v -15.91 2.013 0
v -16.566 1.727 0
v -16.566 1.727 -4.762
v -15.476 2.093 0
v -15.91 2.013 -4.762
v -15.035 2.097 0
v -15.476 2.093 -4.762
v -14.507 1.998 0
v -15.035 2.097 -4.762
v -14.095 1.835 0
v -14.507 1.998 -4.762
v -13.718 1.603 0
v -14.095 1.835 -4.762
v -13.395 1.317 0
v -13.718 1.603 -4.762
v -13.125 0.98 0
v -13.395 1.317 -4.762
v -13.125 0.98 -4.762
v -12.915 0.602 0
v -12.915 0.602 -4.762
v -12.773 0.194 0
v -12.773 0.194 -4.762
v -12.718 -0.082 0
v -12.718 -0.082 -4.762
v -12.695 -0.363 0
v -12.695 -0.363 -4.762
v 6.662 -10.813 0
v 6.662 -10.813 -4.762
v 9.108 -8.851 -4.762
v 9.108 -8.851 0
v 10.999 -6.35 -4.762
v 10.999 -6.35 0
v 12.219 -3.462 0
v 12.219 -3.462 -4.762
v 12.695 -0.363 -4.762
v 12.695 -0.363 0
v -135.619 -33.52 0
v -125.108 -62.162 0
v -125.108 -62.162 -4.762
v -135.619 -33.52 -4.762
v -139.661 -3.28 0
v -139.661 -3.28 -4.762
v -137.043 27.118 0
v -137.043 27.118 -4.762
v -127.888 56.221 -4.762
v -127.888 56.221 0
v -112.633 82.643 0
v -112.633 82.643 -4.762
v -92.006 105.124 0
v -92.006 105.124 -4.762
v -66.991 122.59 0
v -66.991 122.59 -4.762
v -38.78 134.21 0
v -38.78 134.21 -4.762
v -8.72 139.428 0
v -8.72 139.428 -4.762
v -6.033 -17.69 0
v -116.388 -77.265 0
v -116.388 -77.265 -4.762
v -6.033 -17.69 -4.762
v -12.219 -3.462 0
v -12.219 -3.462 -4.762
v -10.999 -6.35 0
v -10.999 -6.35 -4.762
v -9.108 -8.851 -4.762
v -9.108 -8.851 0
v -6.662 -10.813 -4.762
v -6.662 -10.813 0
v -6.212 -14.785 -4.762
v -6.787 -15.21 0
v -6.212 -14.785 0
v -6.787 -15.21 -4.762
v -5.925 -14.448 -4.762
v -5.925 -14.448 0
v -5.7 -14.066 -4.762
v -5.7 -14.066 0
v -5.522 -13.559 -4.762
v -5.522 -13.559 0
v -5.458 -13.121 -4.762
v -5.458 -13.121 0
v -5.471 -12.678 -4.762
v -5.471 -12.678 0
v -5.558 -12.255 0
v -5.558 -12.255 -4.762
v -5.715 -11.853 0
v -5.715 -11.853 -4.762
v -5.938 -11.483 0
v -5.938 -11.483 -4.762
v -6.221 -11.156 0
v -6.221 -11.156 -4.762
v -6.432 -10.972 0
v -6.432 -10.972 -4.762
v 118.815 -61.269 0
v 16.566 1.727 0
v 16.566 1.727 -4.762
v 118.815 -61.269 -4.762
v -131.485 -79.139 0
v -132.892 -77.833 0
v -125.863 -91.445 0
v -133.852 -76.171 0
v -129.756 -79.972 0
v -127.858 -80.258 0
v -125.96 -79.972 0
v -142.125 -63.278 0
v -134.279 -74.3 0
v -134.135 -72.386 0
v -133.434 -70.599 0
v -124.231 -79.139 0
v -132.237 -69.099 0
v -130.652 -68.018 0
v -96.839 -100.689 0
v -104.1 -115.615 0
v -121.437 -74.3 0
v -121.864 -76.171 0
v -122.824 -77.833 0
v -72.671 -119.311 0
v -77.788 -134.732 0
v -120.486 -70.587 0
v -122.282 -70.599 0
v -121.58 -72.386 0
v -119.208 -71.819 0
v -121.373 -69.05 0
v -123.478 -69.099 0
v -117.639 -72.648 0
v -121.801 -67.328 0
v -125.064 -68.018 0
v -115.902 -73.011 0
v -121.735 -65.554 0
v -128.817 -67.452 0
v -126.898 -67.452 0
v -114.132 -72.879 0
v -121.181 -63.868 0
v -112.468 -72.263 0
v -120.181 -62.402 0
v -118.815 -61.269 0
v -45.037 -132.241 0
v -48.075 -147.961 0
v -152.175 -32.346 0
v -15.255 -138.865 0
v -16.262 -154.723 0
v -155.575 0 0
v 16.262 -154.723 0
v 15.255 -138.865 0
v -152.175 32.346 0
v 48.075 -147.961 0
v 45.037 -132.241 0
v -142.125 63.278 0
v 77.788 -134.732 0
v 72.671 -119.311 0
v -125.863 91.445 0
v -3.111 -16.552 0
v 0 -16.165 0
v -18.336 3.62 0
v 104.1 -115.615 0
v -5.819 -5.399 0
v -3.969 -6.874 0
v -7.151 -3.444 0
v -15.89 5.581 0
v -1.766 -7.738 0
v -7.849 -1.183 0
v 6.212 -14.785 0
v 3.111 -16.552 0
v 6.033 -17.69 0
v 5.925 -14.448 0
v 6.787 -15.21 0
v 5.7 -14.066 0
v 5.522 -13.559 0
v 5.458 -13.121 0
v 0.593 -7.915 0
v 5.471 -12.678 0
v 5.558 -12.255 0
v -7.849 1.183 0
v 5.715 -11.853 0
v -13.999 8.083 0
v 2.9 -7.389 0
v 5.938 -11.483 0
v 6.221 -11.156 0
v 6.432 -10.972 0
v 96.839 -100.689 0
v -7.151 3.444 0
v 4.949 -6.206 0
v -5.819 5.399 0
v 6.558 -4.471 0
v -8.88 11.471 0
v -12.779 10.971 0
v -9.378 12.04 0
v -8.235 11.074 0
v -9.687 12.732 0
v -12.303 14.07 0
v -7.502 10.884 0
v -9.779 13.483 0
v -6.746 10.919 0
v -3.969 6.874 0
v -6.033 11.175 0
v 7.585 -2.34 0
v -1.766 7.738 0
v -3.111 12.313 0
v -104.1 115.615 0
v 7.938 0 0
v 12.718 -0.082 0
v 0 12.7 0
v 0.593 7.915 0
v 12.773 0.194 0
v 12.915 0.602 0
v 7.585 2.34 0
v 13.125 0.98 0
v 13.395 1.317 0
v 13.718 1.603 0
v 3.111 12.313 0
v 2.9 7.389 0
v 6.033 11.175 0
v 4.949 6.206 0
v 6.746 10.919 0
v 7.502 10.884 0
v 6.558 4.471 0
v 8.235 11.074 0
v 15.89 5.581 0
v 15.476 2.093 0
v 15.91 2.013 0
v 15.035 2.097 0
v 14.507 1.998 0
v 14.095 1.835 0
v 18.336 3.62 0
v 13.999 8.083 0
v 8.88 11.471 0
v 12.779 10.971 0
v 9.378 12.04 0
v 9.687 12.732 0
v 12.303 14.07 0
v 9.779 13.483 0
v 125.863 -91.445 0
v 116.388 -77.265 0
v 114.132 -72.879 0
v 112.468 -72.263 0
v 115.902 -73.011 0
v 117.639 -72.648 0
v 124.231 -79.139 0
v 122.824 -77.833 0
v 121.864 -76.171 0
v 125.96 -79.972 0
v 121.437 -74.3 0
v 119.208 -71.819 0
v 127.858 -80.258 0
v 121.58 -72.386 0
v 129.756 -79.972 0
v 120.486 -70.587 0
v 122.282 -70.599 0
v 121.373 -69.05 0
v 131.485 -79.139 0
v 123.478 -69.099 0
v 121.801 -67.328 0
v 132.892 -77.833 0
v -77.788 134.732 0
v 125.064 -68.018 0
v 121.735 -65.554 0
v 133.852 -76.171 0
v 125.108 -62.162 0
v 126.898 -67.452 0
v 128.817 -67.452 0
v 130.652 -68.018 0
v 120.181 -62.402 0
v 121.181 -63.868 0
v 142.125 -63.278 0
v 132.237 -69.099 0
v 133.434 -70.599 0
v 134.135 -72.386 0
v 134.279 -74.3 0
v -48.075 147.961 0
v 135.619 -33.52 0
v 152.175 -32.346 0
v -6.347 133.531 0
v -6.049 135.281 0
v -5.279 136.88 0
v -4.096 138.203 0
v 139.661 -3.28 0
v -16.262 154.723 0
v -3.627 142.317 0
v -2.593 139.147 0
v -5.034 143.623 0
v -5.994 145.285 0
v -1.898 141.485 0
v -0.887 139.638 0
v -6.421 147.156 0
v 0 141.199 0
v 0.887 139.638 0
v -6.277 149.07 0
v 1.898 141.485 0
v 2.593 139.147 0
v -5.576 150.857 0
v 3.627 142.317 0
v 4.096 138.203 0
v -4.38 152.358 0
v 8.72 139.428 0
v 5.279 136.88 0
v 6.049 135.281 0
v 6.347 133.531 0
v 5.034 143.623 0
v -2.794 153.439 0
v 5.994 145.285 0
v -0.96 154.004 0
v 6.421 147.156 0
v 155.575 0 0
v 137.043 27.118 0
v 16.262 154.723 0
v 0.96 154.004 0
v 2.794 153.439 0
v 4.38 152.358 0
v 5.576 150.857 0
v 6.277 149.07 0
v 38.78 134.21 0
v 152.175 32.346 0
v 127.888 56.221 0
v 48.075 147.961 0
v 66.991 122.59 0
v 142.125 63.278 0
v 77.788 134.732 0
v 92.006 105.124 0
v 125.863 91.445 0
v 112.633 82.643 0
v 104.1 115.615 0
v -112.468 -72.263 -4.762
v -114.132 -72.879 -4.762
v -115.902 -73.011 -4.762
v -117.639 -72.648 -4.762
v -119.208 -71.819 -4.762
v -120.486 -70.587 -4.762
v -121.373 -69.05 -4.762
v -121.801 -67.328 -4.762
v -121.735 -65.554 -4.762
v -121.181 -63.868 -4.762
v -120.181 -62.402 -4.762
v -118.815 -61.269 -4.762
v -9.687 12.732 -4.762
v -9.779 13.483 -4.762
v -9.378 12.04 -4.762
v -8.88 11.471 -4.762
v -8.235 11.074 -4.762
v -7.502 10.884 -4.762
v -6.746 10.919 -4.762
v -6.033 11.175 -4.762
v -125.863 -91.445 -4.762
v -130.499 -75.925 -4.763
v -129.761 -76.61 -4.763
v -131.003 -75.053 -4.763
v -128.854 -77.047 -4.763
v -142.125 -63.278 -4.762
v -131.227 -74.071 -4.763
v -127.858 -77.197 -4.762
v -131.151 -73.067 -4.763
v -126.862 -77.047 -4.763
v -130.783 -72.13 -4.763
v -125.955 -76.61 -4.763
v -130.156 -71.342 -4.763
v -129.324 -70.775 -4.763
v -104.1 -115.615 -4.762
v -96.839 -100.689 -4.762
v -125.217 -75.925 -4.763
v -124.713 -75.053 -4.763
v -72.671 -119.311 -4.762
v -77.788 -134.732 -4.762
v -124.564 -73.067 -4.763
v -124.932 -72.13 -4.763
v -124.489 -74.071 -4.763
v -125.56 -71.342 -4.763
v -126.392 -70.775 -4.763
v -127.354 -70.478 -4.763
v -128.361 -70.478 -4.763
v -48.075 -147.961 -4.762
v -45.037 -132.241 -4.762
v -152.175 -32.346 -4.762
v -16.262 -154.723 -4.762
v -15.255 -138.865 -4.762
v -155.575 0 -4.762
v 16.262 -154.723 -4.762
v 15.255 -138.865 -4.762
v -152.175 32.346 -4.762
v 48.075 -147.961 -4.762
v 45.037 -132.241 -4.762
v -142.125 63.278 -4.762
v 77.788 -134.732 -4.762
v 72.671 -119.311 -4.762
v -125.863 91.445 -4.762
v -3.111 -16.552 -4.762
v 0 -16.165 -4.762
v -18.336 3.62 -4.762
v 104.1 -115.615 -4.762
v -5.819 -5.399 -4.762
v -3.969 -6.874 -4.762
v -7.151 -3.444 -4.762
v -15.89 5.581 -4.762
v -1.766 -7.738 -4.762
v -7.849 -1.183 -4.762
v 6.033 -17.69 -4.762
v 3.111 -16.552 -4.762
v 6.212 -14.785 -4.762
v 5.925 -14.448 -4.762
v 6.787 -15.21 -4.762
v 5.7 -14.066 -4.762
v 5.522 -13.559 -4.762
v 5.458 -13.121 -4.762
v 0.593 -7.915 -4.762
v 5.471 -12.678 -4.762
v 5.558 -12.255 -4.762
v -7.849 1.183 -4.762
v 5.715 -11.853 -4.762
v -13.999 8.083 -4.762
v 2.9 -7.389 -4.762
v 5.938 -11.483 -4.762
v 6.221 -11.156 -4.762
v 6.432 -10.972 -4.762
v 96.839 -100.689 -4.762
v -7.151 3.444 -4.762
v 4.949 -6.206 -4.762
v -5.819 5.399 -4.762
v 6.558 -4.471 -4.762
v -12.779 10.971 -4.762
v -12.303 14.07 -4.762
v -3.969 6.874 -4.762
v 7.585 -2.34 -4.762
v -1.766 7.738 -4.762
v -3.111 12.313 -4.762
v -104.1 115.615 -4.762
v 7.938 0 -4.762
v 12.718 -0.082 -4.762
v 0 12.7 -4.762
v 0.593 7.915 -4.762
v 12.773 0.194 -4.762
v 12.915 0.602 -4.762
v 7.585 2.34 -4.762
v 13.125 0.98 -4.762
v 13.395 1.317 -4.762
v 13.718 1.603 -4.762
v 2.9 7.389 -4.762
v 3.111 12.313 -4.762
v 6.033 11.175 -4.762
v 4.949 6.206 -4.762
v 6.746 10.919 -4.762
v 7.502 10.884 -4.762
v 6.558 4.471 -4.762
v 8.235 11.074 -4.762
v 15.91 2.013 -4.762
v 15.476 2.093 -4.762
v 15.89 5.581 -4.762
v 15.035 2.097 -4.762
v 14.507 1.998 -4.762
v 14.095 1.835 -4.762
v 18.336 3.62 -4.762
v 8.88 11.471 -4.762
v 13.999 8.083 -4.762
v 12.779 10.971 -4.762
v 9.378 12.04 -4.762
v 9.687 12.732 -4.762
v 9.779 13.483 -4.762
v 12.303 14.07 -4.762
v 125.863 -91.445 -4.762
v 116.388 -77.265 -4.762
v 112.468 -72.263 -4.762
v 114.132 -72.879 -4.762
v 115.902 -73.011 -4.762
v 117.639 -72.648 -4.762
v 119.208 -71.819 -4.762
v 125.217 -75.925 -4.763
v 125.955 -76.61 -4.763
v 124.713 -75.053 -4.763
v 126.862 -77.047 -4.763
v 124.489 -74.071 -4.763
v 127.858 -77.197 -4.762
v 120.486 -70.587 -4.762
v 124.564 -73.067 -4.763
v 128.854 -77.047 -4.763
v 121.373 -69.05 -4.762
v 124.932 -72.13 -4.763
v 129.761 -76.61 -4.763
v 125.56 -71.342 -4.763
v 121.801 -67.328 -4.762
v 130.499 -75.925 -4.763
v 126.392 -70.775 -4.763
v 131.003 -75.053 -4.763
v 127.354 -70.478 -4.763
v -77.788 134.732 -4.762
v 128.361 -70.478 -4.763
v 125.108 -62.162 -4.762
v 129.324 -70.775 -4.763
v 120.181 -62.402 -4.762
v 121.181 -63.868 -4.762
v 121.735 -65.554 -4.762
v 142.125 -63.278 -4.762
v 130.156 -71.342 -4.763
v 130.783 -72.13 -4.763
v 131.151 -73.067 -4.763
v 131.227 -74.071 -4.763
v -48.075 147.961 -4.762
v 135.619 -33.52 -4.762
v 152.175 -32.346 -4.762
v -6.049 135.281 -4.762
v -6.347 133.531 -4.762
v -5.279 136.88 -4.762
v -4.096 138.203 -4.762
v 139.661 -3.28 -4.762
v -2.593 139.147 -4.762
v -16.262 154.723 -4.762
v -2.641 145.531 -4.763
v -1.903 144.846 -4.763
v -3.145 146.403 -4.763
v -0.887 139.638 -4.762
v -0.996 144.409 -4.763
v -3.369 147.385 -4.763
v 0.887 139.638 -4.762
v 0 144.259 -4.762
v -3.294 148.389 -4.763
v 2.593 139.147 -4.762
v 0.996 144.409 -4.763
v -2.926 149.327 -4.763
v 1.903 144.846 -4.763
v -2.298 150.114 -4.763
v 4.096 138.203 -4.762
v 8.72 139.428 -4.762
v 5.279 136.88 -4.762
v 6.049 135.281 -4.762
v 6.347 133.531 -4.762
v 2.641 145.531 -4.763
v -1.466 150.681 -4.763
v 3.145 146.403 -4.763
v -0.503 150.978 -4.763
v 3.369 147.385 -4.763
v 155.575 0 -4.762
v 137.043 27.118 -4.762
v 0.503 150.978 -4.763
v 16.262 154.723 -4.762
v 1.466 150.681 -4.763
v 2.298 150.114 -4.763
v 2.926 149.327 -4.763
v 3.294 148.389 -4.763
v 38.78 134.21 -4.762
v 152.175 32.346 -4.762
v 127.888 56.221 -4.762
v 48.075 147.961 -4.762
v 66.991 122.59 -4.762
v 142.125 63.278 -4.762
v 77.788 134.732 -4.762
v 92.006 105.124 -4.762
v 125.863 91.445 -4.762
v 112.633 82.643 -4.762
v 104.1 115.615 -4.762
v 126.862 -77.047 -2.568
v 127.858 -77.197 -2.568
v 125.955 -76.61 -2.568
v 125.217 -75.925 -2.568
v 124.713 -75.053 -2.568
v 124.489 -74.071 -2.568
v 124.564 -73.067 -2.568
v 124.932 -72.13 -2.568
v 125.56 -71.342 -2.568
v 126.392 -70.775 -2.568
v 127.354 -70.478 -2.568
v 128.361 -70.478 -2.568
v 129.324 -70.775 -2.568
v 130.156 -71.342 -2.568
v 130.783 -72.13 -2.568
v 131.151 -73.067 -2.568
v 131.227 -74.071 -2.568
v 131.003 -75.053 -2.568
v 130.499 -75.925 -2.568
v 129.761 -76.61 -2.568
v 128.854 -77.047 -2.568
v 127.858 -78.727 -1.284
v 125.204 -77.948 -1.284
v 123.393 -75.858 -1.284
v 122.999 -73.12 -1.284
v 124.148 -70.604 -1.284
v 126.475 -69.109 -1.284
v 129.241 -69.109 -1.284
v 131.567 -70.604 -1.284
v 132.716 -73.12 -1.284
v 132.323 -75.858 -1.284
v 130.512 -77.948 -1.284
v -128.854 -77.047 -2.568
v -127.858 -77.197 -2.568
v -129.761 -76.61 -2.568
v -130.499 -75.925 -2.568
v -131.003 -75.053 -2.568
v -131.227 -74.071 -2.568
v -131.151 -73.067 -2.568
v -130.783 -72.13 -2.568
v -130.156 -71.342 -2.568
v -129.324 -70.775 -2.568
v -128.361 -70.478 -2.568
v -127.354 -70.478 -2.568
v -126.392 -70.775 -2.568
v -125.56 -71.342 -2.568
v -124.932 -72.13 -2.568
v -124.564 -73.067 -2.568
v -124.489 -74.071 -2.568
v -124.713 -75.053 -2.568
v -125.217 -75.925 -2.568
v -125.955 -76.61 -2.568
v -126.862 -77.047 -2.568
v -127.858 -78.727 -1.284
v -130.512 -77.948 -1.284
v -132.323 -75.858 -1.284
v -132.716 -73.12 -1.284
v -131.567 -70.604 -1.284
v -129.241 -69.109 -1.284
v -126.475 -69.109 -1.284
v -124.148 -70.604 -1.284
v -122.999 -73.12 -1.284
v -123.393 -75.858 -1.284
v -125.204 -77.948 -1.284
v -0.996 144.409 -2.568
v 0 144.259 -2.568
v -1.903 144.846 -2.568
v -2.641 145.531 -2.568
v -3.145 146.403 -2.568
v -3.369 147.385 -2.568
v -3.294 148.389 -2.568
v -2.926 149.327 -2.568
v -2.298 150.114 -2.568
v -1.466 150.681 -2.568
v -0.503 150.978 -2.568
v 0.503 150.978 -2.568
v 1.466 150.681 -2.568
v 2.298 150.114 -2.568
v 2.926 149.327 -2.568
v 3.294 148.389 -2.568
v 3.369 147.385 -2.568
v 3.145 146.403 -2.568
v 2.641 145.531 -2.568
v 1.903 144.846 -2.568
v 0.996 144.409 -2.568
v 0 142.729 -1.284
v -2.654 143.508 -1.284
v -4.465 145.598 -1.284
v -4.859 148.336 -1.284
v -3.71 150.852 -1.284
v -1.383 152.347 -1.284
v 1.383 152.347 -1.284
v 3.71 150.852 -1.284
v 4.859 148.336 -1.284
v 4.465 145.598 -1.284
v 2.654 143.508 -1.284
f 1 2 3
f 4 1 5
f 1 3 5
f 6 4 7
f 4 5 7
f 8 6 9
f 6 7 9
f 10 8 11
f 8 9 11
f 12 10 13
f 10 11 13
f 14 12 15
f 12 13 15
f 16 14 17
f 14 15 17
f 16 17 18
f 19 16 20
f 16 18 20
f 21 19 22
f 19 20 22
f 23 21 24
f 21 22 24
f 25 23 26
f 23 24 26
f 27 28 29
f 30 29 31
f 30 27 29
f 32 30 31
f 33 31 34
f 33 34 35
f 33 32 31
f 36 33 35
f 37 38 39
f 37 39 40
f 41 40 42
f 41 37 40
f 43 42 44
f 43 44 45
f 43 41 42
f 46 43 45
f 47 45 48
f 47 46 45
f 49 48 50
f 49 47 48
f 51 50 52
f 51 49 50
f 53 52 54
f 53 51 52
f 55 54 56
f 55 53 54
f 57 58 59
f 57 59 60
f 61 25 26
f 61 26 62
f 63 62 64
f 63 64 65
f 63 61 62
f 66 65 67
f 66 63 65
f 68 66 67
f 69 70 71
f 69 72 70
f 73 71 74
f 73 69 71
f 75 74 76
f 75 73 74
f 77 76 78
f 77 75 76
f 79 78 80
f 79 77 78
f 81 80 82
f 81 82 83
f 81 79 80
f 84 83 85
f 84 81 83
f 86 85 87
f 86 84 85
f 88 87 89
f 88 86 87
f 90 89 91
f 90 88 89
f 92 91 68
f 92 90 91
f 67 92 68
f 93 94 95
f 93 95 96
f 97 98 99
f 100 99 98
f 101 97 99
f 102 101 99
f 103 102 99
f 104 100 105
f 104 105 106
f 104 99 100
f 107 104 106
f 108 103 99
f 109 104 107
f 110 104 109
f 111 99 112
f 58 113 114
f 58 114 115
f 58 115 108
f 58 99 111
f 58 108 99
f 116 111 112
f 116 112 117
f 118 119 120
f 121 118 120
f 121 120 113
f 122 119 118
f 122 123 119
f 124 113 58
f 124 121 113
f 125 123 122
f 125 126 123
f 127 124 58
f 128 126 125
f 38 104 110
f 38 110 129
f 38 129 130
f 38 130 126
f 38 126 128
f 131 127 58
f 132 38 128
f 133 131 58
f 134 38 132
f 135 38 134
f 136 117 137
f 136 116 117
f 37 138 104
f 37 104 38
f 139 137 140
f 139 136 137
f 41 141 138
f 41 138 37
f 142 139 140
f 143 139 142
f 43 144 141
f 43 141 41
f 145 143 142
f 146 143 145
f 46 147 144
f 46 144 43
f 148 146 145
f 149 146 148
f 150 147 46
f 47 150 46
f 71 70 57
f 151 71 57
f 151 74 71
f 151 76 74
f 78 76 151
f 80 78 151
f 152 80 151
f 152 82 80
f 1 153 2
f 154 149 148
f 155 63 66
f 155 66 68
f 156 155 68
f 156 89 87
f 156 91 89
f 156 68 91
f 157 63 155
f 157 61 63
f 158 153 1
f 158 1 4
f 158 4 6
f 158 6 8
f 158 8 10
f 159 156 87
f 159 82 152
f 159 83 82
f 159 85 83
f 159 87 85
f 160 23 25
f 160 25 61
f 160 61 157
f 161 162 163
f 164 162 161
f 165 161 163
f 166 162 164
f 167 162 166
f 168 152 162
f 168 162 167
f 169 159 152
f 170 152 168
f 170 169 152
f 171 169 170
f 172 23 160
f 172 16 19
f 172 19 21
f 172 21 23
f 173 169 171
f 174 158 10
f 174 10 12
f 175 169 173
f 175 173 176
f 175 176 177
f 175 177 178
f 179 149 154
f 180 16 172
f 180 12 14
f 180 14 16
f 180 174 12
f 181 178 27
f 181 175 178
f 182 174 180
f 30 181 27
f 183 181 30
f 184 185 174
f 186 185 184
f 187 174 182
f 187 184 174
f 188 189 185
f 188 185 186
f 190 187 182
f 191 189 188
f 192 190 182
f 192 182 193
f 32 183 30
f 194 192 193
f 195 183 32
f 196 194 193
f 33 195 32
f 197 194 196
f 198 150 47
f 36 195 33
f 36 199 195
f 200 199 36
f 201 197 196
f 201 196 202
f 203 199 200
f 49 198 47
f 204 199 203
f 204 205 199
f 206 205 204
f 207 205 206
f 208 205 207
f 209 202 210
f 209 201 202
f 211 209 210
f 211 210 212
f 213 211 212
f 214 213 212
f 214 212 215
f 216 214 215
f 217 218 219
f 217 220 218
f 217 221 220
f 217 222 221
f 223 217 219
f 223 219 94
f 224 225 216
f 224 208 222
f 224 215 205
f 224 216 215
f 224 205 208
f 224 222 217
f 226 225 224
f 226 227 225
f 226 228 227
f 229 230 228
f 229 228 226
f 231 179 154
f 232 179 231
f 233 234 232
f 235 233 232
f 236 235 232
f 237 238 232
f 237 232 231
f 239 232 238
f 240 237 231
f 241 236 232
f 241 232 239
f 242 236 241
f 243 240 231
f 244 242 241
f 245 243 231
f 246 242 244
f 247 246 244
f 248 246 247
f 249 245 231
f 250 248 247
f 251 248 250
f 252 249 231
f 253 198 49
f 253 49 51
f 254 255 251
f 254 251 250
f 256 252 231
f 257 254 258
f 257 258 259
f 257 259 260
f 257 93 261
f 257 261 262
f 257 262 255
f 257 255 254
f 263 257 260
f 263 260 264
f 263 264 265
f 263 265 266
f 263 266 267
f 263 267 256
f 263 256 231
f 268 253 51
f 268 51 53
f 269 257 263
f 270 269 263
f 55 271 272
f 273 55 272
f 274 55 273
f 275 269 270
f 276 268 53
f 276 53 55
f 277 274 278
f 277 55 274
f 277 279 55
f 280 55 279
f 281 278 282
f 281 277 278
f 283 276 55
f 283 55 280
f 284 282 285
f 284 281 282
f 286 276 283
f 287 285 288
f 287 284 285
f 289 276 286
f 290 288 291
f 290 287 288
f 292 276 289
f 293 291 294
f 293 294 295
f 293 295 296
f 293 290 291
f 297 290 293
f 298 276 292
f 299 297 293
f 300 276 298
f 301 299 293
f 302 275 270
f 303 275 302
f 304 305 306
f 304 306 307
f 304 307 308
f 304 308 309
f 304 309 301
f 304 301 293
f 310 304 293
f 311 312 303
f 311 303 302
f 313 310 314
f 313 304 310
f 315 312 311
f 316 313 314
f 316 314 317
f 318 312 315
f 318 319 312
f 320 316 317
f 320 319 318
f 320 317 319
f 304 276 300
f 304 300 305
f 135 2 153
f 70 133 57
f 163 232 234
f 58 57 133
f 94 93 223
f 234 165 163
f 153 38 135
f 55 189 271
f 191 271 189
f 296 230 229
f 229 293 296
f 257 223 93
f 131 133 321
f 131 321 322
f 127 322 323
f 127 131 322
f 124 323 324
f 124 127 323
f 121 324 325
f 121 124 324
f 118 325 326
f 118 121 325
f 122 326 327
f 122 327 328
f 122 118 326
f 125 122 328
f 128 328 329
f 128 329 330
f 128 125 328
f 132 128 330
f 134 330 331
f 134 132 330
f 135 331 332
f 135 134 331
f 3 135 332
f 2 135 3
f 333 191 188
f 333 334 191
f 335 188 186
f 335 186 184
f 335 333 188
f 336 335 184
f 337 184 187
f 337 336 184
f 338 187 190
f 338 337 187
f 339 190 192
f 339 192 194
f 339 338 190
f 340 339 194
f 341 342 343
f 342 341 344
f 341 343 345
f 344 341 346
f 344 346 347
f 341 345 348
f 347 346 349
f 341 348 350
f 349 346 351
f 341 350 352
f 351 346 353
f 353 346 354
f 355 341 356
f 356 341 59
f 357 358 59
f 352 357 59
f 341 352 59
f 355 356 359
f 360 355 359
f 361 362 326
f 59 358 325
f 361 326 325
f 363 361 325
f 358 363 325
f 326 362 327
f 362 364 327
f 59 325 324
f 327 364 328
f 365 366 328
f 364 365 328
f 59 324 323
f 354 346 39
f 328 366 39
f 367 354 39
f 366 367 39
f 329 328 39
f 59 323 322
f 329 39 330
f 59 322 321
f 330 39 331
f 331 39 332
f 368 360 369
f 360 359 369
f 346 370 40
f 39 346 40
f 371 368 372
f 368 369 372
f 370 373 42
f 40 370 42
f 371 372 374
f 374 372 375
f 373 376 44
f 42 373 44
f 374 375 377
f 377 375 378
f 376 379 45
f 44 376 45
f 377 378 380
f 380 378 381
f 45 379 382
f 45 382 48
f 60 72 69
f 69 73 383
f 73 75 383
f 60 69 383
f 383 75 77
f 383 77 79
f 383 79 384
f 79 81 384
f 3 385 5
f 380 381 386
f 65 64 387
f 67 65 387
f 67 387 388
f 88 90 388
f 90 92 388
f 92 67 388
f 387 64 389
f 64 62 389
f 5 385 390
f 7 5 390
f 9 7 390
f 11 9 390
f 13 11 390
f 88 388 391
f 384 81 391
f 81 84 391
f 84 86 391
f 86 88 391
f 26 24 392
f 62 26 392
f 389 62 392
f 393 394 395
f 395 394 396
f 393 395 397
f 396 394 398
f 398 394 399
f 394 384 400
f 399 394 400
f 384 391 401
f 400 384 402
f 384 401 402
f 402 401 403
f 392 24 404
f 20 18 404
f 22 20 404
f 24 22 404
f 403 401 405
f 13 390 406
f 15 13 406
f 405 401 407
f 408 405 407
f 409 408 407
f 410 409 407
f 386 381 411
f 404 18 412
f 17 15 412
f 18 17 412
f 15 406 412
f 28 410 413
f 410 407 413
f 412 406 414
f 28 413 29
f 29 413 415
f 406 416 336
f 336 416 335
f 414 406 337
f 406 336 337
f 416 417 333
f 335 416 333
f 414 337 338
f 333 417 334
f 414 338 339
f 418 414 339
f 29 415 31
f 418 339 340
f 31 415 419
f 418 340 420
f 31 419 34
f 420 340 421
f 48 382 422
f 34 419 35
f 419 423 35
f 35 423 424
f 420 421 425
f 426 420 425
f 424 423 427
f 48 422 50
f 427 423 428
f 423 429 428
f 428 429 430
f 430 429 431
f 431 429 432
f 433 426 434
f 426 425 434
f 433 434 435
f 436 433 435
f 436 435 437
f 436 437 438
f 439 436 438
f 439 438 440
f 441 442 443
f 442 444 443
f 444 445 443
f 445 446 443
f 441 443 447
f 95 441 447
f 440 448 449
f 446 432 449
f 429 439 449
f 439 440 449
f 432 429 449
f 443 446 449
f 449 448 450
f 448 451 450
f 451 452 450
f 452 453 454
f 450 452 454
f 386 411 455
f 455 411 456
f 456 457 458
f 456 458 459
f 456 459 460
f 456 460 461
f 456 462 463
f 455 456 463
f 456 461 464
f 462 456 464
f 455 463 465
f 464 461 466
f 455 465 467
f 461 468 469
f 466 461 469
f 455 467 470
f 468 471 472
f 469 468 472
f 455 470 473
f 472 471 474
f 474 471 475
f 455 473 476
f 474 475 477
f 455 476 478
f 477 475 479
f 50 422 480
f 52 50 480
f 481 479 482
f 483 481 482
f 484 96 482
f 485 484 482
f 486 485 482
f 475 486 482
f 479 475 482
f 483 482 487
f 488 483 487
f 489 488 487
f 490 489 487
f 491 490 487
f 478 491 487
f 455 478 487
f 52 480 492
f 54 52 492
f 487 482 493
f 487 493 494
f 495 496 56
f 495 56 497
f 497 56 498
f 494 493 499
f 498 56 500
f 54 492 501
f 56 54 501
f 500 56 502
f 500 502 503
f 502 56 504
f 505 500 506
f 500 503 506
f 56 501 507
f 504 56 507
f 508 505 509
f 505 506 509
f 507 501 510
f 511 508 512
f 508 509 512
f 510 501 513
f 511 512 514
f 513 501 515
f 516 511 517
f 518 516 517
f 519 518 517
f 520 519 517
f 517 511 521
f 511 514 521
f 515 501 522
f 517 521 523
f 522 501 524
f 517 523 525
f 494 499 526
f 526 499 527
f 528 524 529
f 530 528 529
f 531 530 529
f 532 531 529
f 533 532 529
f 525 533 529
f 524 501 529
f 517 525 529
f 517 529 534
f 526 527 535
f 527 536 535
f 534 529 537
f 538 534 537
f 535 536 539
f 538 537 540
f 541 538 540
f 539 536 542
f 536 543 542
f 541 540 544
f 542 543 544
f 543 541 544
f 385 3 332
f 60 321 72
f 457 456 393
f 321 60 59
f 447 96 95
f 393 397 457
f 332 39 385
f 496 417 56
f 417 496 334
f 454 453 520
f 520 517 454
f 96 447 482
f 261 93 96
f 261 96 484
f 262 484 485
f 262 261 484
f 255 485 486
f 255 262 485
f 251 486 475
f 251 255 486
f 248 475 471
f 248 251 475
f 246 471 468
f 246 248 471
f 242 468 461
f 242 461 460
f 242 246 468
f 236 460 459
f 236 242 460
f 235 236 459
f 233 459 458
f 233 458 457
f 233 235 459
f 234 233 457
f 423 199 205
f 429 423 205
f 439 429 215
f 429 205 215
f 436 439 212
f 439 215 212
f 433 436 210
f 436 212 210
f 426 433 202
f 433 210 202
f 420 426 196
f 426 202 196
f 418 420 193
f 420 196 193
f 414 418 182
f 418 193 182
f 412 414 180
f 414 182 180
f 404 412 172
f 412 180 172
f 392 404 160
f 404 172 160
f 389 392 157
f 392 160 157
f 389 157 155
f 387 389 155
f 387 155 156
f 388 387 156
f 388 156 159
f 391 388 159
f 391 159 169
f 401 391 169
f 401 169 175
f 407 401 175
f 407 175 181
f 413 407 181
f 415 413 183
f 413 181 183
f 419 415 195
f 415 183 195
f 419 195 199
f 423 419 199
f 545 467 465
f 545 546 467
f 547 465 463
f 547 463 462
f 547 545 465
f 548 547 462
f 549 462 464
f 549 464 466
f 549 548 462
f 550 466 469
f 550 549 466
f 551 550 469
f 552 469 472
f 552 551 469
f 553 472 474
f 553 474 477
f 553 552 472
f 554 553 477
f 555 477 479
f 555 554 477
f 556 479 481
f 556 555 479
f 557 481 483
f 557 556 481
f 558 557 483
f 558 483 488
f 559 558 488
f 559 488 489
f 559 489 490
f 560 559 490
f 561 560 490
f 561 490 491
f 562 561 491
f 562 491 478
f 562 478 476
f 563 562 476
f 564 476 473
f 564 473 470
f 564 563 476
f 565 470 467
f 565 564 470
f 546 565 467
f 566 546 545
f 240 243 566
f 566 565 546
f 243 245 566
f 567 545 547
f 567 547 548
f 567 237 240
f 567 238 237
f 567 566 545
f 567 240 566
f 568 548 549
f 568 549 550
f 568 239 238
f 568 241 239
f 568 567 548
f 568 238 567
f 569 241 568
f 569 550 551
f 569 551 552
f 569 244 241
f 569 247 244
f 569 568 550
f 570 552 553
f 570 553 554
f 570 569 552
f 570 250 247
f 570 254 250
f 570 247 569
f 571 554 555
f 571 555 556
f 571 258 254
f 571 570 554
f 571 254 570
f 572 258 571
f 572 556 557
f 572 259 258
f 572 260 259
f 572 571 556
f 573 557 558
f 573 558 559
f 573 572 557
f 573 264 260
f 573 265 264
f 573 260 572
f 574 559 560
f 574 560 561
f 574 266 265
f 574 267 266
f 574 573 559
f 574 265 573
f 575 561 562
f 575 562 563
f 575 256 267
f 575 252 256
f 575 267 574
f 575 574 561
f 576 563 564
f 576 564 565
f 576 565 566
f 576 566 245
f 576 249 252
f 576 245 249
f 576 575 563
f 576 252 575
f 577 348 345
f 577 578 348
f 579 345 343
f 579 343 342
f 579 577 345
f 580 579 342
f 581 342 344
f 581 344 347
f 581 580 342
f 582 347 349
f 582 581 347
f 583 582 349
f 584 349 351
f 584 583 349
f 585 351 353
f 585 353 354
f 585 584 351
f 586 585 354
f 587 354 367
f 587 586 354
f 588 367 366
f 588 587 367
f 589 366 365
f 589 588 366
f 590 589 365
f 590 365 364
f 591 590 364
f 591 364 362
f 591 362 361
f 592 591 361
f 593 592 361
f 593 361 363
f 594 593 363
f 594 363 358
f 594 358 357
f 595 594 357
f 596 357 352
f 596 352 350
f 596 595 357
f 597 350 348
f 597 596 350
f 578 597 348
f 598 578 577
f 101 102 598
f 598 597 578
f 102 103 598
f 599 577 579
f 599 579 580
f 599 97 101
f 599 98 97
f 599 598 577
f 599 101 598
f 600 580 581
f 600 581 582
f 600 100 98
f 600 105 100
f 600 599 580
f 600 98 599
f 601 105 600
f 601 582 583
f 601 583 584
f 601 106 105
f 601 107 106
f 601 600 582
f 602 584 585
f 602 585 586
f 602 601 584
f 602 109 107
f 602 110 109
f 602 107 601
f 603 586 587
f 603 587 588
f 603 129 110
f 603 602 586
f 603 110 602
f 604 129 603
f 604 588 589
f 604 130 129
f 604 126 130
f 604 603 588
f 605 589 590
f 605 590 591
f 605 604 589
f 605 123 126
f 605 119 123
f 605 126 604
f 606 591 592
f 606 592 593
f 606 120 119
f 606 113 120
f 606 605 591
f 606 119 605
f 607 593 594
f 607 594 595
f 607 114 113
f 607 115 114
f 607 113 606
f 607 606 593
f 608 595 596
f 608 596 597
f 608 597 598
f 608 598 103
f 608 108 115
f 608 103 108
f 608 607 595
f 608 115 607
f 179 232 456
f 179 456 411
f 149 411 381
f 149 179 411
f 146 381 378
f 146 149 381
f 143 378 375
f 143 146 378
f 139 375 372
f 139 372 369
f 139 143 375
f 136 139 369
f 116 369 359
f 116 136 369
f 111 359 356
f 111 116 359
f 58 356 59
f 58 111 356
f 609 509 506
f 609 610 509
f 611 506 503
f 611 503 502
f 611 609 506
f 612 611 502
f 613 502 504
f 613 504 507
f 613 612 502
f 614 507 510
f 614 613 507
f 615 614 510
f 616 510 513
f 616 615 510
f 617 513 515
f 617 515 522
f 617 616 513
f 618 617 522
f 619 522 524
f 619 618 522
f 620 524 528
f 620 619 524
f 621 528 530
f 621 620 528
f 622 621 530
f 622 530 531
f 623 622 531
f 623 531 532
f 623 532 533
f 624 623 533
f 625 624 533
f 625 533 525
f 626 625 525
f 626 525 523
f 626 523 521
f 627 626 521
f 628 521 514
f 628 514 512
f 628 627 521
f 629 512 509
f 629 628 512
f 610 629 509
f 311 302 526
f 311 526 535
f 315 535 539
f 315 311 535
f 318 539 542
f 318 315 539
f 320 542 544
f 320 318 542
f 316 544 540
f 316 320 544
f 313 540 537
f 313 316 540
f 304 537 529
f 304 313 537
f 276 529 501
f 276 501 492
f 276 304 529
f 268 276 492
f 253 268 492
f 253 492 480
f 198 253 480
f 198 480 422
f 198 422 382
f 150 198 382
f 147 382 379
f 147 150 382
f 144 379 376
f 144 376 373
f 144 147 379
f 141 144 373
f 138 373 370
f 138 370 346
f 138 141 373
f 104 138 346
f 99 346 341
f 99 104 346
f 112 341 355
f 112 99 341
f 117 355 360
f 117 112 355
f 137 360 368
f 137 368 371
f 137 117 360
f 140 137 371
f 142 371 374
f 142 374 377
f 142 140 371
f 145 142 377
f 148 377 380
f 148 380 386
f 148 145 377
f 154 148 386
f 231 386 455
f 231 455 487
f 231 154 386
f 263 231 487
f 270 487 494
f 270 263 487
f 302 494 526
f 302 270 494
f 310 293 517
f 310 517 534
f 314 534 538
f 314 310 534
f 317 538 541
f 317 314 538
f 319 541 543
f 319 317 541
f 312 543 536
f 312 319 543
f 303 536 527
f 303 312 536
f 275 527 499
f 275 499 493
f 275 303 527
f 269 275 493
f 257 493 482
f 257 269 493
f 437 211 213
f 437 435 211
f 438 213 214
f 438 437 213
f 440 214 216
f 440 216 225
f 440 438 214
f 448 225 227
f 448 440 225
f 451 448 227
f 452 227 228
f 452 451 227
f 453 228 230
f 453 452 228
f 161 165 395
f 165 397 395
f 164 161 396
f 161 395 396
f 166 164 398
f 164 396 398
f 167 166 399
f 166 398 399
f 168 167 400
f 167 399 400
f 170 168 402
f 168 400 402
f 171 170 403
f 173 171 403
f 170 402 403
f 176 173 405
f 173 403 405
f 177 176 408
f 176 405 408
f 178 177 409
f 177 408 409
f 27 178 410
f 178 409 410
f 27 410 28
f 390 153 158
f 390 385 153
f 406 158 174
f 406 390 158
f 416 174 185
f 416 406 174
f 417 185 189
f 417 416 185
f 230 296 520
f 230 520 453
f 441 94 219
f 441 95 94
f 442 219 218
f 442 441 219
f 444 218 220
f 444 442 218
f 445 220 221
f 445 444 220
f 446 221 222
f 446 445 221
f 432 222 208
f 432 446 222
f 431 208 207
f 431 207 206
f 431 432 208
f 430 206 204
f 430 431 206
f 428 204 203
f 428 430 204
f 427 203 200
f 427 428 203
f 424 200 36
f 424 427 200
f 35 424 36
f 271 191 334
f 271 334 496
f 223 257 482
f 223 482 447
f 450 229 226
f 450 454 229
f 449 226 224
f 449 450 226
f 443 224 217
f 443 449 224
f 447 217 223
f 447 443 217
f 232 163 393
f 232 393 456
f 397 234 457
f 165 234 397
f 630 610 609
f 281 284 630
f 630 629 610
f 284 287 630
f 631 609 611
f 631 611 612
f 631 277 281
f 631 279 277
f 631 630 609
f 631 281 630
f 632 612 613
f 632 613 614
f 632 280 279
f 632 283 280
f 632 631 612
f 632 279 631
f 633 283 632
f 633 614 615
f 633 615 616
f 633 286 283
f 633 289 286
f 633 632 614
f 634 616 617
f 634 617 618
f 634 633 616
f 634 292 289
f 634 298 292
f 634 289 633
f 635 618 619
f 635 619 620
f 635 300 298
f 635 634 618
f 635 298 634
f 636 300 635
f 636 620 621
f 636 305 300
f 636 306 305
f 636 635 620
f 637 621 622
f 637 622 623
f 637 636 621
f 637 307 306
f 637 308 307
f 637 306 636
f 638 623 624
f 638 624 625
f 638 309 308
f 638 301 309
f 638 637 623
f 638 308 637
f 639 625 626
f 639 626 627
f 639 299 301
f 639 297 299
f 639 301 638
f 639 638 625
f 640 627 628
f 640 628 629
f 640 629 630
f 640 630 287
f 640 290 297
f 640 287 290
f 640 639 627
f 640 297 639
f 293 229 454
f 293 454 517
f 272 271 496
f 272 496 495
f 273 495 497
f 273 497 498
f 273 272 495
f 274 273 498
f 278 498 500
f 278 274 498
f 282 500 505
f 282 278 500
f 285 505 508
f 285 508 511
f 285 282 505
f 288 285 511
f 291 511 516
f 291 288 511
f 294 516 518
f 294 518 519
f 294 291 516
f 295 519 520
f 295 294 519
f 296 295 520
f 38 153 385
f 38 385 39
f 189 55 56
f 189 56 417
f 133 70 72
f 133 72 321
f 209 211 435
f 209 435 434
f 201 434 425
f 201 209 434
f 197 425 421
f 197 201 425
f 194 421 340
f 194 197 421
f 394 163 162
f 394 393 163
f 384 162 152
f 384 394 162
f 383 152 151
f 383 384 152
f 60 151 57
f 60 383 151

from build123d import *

# Parameters (mm, degrees)
SKETCH1_R                                   = 155.575
SKETCH1_R_2                                 = 7.9375
BOSS_EXTRUDE1_DEPTH                         = 4.7625
FILLET1_R                                   = 12.7
FILLET4_R                                   = 2.54
CSK_FOR_1_4_FLAT_HEAD_MACHINE_SCREW_2_COUNT = 2
CSK_FOR_1_4_FLAT_HEAD_MACHINE_SCREW_2_PITCH = 255.715651102
CSK_FOR_1_4_FLAT_HEAD_MACHINE_SCREW_3_COUNT = 2
CSK_FOR_1_4_FLAT_HEAD_MACHINE_SCREW_3_PITCH = 255.715651102


with BuildPart() as part:
    # Sketch1 → Boss-Extrude1 (new body)
    with BuildSketch(Plane.XY):
        Circle(SKETCH1_R)
        with BuildLine():
            ThreePointArc((-125.107792883, -62.16212802), (-120.983748909, 69.85), (-8.719914422, 139.427590858))
            Line((-8.719914422, 139.427590858), (-12.49892387, 7.216257061))
            Line((-12.49892387, 7.216257061), (-125.107792883, -62.16212802))
        make_face(mode=Mode.SUBTRACT)
        with BuildLine():
            ThreePointArc((8.719914422, 139.427590858), (120.983748909, 69.85), (125.107792883, -62.16212802))
            Line((125.107792883, -62.16212802), (12.49892387, 7.216257061))
            Line((12.49892387, 7.216257061), (8.719914422, 139.427590858))
        make_face(mode=Mode.SUBTRACT)
        with BuildLine():
            ThreePointArc((116.38787846, -77.265462838), (0, -139.7), (-116.38787846, -77.265462838))
            Line((-116.38787846, -77.265462838), (0, -14.432514122))
            Line((0, -14.432514122), (116.38787846, -77.265462838))
        make_face(mode=Mode.SUBTRACT)
        with BuildLine():
            Line((-12.585726429, 4.179407795), (-12.694815268, 0.362857143))
            ThreePointArc((-12.694815268, 0.362857143), (-10.998522628, -6.35), (-6.03316413, -11.17546109))
            Line((-6.03316413, -11.17546109), (-2.673389891, -12.98926271))
            Line((-2.673389891, -12.98926271), (-112.467905529, -72.262730545))
            ThreePointArc((-112.467905529, -72.262730545), (-120.983748909, -69.85), (-118.815313164, -61.268698026))
            Line((-118.815313164, -61.268698026), (-12.585726429, 4.179407795))
        make_face(mode=Mode.SUBTRACT)
        with BuildLine():
            ThreePointArc((118.815313164, -61.268698026), (120.983748909, -69.85), (112.467905529, -72.262730545))
            Line((112.467905529, -72.262730545), (2.673389891, -12.98926271))
            Line((2.673389891, -12.98926271), (6.03316413, -11.17546109))
            ThreePointArc((6.03316413, -11.17546109), (10.998522628, -6.35), (12.694815268, 0.362857143))
            Line((12.694815268, 0.362857143), (12.585726429, 4.179407795))
            Line((12.585726429, 4.179407795), (118.815313164, -61.268698026))
        make_face(mode=Mode.SUBTRACT)
        Circle(SKETCH1_R_2, mode=Mode.SUBTRACT)
        with BuildLine():
            ThreePointArc((-6.347407634, 133.531428571), (0, 139.7), (6.347407634, 133.531428571))
            Line((6.347407634, 133.531428571), (9.938137929, 7.907174875))
            ThreePointArc((9.938137929, 7.907174875), (0, 12.7), (-9.938137929, 7.907174875))
            Line((-9.938137929, 7.907174875), (-6.347407634, 133.531428571))
        make_face(mode=Mode.SUBTRACT)
    extrude(amount=-BOSS_EXTRUDE1_DEPTH)

    # Fillet1
    fillet1_edges = [part.edges().sort_by_distance(p)[0] for p in [
        (12.49892387, 7.216257061, -2.38125),
        (0, -14.432514122, -2.38125),
        (-12.49892387, 7.216257061, -2.38125),
    ]]
    fillet(fillet1_edges, radius=FILLET1_R)

    # Fillet4
    fillet4_edges = [part.edges().sort_by_distance(p)[0] for p in [
        (12.585726429, 4.179407795, -2.38125),
        (2.673389891, -12.98926271, -2.38125),
        (-2.673389891, -12.98926271, -2.38125),
        (-12.585726429, 4.179407795, -2.38125),
        (-9.938137929, 7.907174875, -2.38125),
        (9.938137929, 7.907174875, -2.38125),
    ]]
    fillet(fillet4_edges, radius=FILLET4_R)

    # Sketch4 → CSK for 1/4 Flat Head Machine Screw (100)1 (revolve, cut)
    with BuildSketch(Plane(origin=(0, 147.6375, 0), x_dir=(0, -1, 0), z_dir=(1, 0, 0))):
        Polygon((0, 0), (0, 4.7625), (3.3782, 4.7625), (3.3782, 2.568232241), (6.4389, 0), align=None)
    csk_for_1_4_flat_head_machine_screw_100 = revolve(axis=Axis((0, 147.6375, 6.35), (0, 0, -1)), mode=Mode.SUBTRACT)

    # CSK for 1_4 Flat Head Machine Screw  2: CSK for 1/4 Flat Head Machine Screw (100)1 ×2
    with Locations(*[Vector(0.5, -0.866025404, 0) * (i * CSK_FOR_1_4_FLAT_HEAD_MACHINE_SCREW_2_PITCH) for i in range(1, CSK_FOR_1_4_FLAT_HEAD_MACHINE_SCREW_2_COUNT)]):
        add(csk_for_1_4_flat_head_machine_screw_100, mode=Mode.SUBTRACT)

    # CSK for 1_4 Flat Head Machine Screw  3: CSK for 1/4 Flat Head Machine Screw (100)1 ×2
    with Locations(*[Vector(-0.5, -0.866025404, 0) * (i * CSK_FOR_1_4_FLAT_HEAD_MACHINE_SCREW_3_PITCH) for i in range(1, CSK_FOR_1_4_FLAT_HEAD_MACHINE_SCREW_3_COUNT)]):
        add(csk_for_1_4_flat_head_machine_screw_100, mode=Mode.SUBTRACT)


solid = part.part
